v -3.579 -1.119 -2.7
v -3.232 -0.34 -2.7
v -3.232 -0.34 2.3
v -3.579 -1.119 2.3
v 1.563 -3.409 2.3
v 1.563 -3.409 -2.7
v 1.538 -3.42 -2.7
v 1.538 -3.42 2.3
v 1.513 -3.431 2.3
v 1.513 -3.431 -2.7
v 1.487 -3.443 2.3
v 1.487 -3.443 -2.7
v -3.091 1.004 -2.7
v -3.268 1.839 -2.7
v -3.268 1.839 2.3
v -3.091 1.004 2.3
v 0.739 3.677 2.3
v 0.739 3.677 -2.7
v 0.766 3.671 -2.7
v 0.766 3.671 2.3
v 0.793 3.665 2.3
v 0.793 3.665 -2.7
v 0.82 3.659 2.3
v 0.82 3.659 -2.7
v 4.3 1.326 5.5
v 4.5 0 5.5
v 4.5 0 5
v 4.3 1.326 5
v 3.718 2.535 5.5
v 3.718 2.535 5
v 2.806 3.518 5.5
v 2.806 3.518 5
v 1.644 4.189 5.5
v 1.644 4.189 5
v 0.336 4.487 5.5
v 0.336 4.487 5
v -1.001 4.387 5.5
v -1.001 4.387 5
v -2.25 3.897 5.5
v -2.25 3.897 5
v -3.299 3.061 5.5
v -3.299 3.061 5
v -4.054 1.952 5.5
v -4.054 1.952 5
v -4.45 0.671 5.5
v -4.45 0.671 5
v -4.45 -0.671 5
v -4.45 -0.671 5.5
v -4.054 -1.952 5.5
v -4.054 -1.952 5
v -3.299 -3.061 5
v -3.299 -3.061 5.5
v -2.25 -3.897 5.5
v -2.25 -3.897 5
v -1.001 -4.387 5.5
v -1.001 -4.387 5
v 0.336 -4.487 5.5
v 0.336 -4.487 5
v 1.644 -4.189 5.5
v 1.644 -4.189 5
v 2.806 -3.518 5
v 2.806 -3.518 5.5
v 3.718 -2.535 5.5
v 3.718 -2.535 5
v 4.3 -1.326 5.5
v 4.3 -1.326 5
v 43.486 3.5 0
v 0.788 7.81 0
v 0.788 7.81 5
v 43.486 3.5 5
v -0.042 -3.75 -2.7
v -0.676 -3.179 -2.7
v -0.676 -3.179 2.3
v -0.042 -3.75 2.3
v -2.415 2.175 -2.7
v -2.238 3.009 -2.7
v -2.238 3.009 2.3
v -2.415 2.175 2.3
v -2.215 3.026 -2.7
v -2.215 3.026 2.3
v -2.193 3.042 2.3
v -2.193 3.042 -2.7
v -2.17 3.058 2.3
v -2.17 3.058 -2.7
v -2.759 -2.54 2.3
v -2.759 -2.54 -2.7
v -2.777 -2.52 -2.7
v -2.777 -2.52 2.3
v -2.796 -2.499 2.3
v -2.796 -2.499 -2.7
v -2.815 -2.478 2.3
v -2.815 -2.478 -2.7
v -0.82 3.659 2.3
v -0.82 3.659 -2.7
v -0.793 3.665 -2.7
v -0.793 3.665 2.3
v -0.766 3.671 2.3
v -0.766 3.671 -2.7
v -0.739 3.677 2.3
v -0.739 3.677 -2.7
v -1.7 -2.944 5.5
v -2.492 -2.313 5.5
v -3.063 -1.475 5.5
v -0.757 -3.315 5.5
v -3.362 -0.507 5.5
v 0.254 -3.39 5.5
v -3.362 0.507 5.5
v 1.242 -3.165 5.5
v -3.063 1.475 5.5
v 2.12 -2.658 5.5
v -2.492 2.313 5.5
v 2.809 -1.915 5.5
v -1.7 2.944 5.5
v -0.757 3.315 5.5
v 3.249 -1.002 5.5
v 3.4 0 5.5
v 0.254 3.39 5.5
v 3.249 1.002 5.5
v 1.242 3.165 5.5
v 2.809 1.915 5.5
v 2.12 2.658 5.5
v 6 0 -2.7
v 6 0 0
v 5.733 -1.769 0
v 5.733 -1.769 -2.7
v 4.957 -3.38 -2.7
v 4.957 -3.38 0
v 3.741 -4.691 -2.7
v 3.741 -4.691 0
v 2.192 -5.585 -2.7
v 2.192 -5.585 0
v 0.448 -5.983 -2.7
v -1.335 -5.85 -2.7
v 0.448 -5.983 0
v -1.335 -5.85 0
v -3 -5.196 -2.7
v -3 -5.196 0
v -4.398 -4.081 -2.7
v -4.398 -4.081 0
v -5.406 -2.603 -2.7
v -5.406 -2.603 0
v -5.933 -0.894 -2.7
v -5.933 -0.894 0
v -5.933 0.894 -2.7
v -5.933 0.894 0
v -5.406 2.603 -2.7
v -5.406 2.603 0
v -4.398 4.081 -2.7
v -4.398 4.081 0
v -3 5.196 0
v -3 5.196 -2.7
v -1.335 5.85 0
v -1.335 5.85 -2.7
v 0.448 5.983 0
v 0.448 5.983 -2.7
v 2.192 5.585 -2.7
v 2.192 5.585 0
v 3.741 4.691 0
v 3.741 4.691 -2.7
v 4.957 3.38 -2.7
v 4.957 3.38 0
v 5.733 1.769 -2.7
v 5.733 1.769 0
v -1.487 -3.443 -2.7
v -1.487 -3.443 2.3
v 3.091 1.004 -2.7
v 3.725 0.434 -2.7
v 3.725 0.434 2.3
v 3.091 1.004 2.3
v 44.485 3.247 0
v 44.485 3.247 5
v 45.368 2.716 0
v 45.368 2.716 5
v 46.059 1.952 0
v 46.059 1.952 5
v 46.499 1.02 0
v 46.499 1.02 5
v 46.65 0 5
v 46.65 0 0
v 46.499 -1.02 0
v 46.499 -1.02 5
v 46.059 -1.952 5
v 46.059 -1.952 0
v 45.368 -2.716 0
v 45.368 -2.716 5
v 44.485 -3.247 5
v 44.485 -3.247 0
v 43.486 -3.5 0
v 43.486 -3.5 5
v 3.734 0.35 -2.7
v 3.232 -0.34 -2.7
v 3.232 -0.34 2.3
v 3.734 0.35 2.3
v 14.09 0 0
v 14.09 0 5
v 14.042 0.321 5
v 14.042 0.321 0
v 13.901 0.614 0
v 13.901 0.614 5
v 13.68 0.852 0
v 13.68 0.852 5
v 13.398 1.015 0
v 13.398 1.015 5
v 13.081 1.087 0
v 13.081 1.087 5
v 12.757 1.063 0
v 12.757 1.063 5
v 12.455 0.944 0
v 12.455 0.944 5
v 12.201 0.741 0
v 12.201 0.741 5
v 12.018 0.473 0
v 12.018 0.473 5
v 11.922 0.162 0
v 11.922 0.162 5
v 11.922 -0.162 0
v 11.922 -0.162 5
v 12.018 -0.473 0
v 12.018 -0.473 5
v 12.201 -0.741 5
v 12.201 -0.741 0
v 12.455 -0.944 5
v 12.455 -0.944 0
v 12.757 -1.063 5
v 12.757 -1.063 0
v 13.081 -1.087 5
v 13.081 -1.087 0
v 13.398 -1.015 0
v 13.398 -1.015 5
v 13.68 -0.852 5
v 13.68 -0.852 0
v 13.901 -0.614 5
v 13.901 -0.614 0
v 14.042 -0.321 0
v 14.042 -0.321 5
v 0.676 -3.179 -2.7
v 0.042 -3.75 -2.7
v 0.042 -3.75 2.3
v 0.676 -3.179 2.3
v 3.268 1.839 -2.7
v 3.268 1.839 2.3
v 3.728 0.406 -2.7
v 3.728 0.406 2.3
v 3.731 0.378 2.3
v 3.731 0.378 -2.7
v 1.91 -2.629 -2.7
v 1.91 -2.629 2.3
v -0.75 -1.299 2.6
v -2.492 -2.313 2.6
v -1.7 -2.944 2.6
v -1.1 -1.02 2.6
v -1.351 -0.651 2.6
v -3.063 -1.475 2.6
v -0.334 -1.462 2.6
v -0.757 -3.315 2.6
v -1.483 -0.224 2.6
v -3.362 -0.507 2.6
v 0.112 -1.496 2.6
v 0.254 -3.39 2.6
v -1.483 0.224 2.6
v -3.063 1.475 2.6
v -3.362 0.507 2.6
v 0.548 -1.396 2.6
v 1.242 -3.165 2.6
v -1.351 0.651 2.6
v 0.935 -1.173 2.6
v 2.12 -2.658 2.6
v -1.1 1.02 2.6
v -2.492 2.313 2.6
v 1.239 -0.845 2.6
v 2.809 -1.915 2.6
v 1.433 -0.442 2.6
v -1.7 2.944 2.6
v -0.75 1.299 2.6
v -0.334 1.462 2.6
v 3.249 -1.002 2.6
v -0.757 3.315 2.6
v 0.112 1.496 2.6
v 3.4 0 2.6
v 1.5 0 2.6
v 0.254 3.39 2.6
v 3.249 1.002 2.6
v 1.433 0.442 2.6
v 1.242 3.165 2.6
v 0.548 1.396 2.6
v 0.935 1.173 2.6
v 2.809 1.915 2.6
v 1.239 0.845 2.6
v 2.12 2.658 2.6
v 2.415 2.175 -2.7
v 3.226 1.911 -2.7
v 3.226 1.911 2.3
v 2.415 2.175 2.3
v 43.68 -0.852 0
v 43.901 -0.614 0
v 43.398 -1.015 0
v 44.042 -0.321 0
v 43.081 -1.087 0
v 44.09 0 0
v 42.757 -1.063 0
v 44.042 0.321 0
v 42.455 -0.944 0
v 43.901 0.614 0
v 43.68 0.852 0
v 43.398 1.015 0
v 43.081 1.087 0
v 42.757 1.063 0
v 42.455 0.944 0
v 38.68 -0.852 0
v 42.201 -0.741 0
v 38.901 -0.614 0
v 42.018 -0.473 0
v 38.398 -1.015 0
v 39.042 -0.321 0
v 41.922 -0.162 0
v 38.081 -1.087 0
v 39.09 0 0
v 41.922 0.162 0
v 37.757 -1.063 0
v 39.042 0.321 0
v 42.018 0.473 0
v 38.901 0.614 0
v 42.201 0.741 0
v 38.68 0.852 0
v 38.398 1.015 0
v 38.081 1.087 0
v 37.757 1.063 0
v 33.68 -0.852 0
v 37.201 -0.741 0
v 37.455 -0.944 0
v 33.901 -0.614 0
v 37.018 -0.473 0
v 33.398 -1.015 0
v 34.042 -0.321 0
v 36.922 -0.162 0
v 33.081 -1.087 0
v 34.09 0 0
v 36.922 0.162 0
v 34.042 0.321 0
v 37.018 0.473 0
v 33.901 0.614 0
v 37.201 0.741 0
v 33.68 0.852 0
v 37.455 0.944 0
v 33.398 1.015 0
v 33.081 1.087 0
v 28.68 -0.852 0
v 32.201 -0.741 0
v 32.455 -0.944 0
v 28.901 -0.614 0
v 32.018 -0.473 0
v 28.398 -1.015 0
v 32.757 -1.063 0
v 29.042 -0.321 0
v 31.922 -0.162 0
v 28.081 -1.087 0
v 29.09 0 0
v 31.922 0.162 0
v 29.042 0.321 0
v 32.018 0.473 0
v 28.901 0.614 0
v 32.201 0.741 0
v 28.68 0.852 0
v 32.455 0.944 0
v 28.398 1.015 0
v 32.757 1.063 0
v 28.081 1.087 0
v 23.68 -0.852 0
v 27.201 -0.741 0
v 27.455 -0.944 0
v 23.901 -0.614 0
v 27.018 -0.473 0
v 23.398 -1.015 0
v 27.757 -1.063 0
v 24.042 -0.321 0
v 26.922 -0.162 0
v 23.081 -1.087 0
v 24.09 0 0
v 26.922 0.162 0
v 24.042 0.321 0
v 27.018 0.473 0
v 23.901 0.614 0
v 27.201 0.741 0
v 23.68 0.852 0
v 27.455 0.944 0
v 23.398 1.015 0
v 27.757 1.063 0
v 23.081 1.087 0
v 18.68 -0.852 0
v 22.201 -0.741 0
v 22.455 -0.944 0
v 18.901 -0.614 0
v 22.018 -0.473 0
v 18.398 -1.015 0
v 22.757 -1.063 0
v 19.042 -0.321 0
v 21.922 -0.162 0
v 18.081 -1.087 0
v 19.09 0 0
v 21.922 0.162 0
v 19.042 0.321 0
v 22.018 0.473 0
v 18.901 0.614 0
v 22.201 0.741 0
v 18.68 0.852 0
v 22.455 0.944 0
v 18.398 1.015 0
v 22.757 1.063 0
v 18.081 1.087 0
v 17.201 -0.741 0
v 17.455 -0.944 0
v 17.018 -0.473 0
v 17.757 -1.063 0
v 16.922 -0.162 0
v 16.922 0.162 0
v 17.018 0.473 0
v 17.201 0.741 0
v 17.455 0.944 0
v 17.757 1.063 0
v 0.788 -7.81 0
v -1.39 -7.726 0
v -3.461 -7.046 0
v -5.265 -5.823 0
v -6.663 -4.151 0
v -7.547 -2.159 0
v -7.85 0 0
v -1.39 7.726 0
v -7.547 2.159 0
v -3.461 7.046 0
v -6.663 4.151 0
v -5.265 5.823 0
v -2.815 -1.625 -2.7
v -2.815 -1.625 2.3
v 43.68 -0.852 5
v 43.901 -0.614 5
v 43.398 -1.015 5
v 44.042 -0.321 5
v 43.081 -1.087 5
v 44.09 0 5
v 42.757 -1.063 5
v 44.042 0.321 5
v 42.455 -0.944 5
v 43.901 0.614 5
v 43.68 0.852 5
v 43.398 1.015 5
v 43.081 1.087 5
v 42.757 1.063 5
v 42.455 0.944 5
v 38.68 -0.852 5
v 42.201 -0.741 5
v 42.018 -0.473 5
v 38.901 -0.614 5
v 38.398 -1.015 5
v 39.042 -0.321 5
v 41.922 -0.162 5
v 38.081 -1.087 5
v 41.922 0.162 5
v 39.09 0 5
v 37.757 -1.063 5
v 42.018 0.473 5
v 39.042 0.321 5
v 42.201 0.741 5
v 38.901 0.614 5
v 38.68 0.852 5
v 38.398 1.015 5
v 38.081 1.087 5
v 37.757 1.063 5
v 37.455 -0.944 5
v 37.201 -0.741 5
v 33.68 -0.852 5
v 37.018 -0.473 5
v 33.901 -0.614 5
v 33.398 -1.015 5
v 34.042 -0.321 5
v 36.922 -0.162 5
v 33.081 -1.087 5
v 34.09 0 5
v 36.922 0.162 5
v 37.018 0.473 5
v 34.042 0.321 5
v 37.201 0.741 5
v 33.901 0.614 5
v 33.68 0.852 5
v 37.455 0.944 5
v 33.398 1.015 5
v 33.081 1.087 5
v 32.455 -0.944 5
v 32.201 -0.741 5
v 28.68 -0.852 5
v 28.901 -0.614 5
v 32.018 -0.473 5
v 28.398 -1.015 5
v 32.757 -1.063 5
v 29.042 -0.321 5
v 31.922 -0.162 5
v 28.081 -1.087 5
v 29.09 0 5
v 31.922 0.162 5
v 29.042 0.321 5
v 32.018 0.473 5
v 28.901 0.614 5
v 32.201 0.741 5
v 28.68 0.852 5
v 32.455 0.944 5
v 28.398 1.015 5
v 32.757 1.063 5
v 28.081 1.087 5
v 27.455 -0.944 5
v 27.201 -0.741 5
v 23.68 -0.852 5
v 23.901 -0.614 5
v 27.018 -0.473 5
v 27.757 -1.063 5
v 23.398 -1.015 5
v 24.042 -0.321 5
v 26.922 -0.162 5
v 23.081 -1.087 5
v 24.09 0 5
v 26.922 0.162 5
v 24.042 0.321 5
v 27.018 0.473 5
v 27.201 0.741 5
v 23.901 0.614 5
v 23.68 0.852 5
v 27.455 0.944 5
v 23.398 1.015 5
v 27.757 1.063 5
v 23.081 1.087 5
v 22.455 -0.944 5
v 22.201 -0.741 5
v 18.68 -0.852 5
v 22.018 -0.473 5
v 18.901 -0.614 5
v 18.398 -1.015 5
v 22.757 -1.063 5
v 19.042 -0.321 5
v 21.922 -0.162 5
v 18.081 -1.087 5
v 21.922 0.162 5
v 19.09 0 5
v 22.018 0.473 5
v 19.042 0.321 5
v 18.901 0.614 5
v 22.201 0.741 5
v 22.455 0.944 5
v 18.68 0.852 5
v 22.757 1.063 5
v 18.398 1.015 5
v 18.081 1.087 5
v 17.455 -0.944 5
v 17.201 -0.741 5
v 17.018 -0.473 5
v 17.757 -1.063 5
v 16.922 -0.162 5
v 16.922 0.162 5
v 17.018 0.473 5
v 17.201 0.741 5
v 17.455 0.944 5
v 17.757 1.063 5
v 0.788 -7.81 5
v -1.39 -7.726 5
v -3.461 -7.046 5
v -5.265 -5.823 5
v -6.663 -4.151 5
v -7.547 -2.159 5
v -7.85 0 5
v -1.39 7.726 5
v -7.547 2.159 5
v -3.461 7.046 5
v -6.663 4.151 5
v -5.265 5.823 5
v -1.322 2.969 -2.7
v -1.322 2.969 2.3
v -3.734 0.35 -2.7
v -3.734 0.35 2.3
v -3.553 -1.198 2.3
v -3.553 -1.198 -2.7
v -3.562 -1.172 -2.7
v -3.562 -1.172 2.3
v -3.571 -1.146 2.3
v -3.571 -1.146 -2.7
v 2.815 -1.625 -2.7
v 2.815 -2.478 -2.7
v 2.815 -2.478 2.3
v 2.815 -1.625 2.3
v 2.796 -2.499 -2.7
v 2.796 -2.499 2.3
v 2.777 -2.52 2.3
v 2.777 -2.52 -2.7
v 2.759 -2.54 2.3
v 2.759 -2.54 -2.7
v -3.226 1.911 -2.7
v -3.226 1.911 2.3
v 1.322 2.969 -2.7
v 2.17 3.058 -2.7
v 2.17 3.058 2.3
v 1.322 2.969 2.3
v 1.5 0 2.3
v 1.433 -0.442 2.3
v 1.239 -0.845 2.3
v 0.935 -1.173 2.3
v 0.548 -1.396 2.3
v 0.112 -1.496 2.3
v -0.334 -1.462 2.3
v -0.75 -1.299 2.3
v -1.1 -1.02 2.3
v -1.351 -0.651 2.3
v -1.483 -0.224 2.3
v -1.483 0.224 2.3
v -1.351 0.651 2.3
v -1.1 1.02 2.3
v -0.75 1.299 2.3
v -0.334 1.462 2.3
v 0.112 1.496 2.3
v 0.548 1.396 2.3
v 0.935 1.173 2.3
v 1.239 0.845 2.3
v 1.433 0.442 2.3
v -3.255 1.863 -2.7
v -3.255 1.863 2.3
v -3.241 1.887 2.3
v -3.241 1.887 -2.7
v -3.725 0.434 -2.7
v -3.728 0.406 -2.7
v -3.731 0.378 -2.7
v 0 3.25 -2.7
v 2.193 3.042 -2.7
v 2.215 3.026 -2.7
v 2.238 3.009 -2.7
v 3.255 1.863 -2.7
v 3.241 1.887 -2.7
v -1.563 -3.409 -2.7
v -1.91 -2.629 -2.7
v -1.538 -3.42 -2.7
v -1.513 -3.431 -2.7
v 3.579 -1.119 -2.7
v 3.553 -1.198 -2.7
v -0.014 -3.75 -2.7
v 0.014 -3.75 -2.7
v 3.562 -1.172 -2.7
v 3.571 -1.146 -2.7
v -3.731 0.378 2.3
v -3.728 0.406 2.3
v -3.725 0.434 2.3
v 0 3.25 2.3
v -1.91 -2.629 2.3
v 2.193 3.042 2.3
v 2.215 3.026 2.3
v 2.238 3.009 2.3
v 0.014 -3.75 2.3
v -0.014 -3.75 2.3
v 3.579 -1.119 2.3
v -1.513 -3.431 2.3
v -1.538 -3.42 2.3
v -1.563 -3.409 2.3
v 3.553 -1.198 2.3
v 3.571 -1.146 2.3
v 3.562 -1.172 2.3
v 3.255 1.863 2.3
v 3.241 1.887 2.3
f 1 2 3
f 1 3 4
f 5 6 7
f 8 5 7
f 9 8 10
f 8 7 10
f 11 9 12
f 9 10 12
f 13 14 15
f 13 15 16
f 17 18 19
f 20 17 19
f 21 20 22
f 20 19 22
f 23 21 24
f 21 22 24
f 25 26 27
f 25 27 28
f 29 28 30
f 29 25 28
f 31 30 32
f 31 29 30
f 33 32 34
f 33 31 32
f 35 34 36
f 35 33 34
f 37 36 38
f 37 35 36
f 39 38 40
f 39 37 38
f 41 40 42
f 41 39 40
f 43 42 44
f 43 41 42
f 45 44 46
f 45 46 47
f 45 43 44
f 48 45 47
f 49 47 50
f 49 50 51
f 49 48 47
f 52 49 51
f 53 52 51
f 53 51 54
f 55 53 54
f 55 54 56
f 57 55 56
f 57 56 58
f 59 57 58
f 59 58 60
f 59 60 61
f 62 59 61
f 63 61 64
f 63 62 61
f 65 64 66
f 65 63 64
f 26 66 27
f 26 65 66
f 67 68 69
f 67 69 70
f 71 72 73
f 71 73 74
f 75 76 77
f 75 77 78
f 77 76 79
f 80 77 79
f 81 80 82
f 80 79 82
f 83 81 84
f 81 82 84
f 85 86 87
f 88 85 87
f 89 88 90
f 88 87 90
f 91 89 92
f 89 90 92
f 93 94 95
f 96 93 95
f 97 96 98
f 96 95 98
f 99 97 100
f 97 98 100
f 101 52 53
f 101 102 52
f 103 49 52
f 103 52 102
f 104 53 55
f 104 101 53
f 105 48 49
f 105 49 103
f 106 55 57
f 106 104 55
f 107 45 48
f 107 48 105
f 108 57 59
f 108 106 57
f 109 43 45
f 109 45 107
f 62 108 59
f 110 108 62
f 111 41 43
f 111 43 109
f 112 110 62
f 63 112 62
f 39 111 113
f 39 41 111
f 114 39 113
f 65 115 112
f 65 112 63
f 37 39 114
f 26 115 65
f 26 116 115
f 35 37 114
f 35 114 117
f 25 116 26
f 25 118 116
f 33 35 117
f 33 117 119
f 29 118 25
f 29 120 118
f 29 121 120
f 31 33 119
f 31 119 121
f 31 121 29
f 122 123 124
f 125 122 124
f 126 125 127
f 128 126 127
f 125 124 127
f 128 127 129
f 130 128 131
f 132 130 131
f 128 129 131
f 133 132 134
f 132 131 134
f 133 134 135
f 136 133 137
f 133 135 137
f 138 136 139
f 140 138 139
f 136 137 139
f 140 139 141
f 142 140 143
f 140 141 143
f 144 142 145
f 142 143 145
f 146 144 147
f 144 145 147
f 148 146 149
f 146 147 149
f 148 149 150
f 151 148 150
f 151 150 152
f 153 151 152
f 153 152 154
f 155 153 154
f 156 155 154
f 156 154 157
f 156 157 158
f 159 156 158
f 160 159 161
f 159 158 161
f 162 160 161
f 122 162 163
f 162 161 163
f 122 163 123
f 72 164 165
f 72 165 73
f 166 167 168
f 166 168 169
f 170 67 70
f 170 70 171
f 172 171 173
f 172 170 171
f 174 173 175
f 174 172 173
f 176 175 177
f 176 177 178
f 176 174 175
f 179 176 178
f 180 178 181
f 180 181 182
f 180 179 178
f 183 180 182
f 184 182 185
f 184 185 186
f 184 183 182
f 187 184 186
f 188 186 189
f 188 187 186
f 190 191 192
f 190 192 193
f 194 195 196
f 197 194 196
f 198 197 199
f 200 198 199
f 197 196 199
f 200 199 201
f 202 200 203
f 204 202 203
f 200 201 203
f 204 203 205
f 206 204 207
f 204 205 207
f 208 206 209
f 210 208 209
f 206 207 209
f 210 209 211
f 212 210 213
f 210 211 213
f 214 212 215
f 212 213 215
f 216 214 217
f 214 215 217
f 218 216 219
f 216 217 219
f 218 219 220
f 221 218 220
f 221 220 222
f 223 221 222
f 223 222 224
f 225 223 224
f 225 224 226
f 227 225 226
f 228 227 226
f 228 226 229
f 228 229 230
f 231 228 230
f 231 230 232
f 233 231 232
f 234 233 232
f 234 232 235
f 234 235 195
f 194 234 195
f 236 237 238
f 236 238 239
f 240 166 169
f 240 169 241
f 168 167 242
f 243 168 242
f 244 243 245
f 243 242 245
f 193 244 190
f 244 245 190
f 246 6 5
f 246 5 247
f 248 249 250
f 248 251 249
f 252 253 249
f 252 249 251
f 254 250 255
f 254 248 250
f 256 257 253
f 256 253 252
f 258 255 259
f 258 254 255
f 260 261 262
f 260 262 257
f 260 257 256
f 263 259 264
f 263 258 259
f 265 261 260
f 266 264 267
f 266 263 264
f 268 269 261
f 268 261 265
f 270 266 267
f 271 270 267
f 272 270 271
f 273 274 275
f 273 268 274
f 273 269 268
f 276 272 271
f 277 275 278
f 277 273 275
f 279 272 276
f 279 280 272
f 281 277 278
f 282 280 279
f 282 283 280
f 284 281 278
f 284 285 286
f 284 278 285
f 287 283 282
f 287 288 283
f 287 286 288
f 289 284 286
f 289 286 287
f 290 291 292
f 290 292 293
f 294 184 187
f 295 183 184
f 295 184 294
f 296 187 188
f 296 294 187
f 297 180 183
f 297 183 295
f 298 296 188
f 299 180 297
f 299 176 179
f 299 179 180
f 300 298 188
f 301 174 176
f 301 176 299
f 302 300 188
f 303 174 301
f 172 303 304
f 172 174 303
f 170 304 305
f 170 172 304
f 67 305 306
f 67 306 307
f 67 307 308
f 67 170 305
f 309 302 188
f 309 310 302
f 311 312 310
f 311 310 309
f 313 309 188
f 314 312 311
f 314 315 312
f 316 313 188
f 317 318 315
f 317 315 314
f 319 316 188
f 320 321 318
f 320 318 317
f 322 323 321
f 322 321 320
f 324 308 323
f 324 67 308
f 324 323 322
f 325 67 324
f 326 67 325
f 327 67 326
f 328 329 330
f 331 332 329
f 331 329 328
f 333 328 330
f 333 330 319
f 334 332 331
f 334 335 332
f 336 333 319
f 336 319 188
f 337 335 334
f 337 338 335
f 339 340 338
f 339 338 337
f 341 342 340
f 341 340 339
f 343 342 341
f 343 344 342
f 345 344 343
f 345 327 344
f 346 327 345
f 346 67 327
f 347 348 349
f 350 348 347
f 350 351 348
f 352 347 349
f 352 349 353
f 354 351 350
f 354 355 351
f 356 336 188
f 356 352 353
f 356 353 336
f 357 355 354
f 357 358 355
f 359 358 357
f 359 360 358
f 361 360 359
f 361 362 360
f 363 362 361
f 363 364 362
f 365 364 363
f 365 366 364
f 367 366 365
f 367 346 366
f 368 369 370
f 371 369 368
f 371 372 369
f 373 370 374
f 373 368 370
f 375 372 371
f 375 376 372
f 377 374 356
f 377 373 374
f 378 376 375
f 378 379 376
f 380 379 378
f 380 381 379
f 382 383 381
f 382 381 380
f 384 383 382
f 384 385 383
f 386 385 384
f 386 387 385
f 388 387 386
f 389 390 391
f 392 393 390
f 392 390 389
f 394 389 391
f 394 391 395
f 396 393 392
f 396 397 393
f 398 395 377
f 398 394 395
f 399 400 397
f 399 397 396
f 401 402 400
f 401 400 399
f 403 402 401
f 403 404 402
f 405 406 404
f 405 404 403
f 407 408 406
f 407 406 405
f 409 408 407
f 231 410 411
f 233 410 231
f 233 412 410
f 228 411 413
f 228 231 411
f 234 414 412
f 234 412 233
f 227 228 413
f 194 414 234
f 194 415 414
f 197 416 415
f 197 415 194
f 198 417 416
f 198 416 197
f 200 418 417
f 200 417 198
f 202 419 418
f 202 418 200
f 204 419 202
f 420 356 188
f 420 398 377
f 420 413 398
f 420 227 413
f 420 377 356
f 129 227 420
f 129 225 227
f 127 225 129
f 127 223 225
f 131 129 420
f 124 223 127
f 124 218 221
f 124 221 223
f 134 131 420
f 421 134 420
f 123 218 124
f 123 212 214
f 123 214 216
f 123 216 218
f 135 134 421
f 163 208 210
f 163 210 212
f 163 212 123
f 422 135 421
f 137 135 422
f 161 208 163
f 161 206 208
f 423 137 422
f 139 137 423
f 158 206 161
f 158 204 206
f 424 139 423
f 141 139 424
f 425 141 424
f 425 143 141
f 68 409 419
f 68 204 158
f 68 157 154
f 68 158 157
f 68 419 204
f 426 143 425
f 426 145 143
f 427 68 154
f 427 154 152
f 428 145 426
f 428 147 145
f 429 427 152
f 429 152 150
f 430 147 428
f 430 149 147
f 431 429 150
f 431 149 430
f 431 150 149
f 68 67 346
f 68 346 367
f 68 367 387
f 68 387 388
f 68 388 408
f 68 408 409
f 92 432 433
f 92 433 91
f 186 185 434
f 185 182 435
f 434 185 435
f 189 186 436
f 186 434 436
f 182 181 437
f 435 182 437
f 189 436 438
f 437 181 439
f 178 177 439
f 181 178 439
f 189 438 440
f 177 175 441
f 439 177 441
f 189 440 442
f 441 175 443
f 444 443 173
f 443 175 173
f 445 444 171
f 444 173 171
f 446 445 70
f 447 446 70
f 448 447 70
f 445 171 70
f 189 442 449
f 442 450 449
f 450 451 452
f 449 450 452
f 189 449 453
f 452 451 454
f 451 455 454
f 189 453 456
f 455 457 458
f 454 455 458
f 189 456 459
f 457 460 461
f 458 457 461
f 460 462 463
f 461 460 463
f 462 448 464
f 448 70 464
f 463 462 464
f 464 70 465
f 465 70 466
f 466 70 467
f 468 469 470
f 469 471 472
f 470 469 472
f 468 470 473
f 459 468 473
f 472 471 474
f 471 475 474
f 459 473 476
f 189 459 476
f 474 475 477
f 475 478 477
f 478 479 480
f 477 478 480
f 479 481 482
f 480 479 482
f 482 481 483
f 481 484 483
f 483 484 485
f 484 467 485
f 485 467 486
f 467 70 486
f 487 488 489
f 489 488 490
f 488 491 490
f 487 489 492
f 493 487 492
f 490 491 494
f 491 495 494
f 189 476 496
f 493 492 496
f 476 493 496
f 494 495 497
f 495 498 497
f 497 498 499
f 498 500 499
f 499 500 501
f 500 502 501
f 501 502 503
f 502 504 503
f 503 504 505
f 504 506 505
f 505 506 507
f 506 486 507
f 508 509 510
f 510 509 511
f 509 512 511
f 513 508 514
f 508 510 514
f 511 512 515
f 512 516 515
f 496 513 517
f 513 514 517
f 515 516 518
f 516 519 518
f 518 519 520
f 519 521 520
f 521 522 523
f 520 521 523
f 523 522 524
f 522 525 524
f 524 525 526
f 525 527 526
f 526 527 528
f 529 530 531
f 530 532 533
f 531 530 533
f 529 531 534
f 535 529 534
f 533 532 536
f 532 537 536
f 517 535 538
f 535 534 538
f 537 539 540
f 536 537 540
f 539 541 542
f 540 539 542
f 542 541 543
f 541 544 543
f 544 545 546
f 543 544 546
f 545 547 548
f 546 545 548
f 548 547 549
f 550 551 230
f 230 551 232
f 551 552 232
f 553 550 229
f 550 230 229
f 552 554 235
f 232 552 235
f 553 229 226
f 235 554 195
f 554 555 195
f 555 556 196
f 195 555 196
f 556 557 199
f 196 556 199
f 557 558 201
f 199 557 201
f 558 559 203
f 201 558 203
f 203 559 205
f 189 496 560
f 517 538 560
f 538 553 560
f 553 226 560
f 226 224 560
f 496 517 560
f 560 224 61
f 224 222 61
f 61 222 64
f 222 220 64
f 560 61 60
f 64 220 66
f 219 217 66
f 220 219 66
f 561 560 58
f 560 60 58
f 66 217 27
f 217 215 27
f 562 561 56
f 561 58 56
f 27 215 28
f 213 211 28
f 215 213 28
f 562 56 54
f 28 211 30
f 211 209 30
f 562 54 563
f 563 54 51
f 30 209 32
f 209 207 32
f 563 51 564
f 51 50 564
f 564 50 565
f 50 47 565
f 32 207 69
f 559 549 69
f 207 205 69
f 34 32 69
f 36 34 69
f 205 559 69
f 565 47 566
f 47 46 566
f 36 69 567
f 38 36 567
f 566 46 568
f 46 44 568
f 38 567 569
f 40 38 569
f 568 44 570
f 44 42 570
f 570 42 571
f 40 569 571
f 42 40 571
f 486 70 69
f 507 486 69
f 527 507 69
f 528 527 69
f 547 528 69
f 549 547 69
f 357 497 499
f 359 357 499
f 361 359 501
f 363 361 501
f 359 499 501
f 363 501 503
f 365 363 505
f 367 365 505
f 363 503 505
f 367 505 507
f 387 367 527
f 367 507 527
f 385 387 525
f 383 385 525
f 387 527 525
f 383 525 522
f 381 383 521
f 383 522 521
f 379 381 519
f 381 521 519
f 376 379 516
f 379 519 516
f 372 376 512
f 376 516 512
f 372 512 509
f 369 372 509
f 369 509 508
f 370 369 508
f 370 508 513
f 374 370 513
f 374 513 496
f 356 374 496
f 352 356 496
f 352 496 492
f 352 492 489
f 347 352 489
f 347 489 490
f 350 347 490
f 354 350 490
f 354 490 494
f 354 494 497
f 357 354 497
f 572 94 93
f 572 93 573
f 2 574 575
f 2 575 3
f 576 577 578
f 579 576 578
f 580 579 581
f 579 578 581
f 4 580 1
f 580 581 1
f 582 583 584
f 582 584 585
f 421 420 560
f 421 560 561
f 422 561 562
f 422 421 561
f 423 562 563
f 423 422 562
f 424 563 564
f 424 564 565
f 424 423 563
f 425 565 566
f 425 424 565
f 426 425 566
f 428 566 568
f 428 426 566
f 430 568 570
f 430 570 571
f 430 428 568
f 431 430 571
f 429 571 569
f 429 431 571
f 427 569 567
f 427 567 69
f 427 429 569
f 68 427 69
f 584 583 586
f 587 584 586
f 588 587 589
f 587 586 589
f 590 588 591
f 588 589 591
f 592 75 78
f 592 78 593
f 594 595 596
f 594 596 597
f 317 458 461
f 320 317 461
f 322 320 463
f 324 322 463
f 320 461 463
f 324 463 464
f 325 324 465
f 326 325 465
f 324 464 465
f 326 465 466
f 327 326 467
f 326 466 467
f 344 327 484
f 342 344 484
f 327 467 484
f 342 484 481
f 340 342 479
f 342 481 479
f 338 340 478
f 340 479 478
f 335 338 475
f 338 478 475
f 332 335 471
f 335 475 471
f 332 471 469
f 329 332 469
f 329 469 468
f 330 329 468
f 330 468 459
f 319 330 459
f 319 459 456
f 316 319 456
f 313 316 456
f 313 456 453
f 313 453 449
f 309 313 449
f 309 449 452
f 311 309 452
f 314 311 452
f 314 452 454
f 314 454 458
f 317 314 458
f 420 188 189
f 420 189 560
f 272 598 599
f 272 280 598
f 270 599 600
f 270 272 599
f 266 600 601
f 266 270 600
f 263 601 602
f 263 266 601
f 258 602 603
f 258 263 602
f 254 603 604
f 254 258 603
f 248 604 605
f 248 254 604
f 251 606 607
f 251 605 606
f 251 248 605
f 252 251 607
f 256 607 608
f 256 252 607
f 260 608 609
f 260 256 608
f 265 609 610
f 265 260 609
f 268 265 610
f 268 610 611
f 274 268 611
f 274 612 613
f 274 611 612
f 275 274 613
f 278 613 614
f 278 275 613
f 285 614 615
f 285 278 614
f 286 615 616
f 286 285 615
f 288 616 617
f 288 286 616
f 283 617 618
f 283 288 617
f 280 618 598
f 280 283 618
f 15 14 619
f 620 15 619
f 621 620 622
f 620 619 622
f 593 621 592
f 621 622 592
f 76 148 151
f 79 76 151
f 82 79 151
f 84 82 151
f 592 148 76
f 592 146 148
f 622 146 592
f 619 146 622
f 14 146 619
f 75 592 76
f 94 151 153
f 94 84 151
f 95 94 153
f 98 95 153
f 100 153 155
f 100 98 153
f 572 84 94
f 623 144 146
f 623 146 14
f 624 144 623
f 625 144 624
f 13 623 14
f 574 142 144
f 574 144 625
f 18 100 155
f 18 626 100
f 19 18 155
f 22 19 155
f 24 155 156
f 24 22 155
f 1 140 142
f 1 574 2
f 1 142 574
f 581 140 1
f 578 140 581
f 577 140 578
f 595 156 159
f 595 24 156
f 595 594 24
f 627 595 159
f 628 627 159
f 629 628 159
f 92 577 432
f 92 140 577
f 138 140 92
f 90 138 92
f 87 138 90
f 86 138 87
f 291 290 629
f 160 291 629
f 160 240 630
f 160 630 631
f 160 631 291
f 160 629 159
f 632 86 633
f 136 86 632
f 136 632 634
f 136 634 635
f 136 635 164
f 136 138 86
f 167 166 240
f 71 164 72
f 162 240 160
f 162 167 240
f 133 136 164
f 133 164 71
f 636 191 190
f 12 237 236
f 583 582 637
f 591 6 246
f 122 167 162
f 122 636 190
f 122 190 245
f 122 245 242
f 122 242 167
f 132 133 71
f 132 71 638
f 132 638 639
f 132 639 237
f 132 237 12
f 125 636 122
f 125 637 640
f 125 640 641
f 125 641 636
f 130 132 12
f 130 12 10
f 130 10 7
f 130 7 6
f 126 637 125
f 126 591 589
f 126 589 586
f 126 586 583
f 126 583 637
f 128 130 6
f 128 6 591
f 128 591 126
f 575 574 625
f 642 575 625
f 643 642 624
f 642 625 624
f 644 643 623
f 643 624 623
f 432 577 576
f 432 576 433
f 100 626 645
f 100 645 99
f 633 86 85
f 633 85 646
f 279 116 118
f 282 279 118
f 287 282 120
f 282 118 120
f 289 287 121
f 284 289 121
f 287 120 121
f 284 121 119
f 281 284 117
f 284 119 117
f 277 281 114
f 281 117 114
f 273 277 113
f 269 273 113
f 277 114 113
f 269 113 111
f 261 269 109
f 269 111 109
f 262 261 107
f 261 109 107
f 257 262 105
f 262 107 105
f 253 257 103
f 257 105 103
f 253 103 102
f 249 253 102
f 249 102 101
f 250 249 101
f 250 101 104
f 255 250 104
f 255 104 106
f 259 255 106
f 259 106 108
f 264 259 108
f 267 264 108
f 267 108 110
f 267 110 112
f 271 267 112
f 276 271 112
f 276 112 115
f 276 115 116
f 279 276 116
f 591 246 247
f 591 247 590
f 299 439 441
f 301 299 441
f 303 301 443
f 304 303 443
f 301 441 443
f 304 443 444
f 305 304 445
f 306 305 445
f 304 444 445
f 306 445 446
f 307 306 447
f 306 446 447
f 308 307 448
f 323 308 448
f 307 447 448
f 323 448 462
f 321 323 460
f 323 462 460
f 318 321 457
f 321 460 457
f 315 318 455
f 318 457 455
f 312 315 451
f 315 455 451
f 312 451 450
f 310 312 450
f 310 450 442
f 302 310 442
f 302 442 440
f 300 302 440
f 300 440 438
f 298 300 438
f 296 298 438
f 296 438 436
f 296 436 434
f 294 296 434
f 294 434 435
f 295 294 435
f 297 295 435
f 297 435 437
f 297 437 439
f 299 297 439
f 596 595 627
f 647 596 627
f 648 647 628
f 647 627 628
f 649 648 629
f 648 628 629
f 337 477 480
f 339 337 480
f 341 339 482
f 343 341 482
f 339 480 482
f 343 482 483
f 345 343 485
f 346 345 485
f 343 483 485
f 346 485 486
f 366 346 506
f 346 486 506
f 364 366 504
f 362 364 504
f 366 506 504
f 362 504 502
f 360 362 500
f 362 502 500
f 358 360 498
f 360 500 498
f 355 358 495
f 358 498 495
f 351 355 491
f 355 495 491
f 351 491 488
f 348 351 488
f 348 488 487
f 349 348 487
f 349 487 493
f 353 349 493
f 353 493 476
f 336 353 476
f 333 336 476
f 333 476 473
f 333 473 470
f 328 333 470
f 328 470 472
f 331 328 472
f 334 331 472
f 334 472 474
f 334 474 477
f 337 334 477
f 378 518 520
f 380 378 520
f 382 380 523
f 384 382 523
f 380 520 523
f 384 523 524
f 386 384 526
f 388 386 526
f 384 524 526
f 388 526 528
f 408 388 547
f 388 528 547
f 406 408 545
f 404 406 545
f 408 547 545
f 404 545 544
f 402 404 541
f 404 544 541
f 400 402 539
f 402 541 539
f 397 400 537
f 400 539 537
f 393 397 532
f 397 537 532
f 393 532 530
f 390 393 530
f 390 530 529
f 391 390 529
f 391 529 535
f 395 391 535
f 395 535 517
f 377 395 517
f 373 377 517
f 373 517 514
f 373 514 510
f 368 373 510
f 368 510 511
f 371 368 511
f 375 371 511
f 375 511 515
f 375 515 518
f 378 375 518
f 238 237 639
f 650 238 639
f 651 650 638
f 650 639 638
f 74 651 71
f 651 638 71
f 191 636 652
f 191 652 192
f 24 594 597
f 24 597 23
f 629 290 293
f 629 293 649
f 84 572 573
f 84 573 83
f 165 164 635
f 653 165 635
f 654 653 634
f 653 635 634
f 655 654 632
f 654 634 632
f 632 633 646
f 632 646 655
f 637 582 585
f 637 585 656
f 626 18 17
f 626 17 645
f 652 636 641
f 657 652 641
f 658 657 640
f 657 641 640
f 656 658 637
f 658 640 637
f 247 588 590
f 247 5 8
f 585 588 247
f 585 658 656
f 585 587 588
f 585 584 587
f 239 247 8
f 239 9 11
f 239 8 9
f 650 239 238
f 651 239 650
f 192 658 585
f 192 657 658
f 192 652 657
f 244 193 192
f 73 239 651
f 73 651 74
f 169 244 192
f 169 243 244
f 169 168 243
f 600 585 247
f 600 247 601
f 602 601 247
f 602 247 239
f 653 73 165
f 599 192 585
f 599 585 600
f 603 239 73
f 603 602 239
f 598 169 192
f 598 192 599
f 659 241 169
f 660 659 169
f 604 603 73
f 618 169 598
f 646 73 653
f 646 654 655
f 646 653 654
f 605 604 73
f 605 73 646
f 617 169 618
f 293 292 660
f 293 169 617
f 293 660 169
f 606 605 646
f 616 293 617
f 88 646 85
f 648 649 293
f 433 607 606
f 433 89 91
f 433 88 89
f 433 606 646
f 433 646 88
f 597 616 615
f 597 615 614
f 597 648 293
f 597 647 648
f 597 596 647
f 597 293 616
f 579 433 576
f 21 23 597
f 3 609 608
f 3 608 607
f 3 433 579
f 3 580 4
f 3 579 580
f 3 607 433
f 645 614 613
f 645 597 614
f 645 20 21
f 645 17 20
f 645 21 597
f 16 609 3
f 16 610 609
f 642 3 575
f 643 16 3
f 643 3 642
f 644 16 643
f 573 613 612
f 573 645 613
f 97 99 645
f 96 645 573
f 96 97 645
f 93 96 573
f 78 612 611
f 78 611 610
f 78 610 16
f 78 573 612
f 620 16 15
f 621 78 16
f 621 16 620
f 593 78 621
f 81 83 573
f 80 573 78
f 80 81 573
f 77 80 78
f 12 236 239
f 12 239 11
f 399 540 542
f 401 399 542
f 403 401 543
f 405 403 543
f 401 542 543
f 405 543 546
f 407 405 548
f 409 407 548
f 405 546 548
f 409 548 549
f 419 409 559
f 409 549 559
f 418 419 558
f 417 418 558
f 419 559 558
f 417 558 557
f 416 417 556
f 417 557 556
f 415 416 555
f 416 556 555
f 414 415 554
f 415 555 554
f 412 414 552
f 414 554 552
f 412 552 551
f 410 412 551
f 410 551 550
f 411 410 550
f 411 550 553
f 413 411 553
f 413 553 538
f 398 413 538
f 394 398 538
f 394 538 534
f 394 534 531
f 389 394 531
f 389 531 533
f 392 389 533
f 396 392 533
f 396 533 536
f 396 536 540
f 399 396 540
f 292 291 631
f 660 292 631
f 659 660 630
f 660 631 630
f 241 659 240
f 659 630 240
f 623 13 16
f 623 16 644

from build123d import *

# Parameters (mm, degrees)
BOSS_EXTRUDE1_DEPTH = 5
CUT_EXTRUDE1_REACH  = 49.569
SKETCH2_R           = 1.5
SKETCH3_R           = 3.4
CUT_EXTRUDE2_DEPTH  = 2.4
BOSS_EXTRUDE2_START = 0.5
SKETCH4_R           = 4.5
SKETCH4_R_2         = 3.4
BOSS_EXTRUDE2_DEPTH = 0.5
SKETCH6_R           = 6
SKETCH6_R_2         = 1.5
BOSS_EXTRUDE3_DEPTH = 2.7
SKETCH7_R           = 3.75
CUT_EXTRUDE4_DEPTH  = 5
BOSS_EXTRUDE4_DEPTH = 5
CIRPATTERN2_COUNT   = 15
CUT_EXTRUDE5_REACH  = 49.928
SKETCH10_R          = 1.09


with BuildPart() as part:
    # Sketch1 → Boss-Extrude1 (new body)
    with BuildSketch(Plane.XY):
        with BuildLine():
            Line((0.788456111, 7.810303257), (43.485538544, 3.5))
            ThreePointArc((43.485538544, 3.5), (46.65, 0), (43.485538544, -3.5))
            Line((43.485538544, -3.5), (0.788456111, -7.810303257))
            ThreePointArc((0.788456111, -7.810303257), (-7.85, 0), (0.788456111, 7.810303257))
        make_face()
    extrude(amount=BOSS_EXTRUDE1_DEPTH)

    # Sketch2 → Cut-Extrude1 (cut, up to next)
    with BuildSketch(Plane.XY.offset(5), mode=Mode.PRIVATE) as cut_extrude1_sk1:
        Circle(SKETCH2_R)
    cut_extrude1_tool1 = extrude(cut_extrude1_sk1.sketch, amount=-CUT_EXTRUDE1_REACH, mode=Mode.PRIVATE) & part.part
    add(cut_extrude1_tool1.solids().sort_by_distance((0, 0, 5))[0], mode=Mode.SUBTRACT)

    # Sketch3 → Cut-Extrude2 (cut)
    with BuildSketch(Plane.XY.offset(5)):
        Circle(SKETCH3_R)
    extrude(amount=-CUT_EXTRUDE2_DEPTH, mode=Mode.SUBTRACT)

    # Sketch4 → Boss-Extrude2 (add)
    with BuildSketch(Plane.XY.offset(5).offset(BOSS_EXTRUDE2_START)):
        Circle(SKETCH4_R)
        Circle(SKETCH4_R_2, mode=Mode.SUBTRACT)
    extrude(amount=-BOSS_EXTRUDE2_DEPTH)

    # Sketch6 → Boss-Extrude3 (add)
    with BuildSketch(Plane(origin=(0, 0, 0), x_dir=(-1, 0, 0), z_dir=(0, 0, -1))):
        with Locations(Location((0, 0, 0), (0, 0, 180))):
            Circle(SKETCH6_R)
        with Locations(Location((0, 0, 0), (0, 0, 180))):
            Circle(SKETCH6_R_2, mode=Mode.SUBTRACT)
    extrude(amount=BOSS_EXTRUDE3_DEPTH)

    # Sketch7 → Cut-Extrude4 (cut)
    with BuildSketch(Plane(origin=(0, 0, -2.7), x_dir=(-1, 0, 0), z_dir=(0, 0, -1))):
        Circle(SKETCH7_R)
    extrude(amount=-CUT_EXTRUDE4_DEPTH, mode=Mode.SUBTRACT)

    # Sketch8 → Boss-Extrude4 (add)
    with BuildSketch(Plane(origin=(0, 0, -2.7), x_dir=(-1, 0, 0), z_dir=(0, 0, -1))):
        with BuildLine():
            Line((-0.738744308, 3.676514225), (0, 3.25))
            Line((0, 3.25), (0.738744308, 3.676514225))
            ThreePointArc((0.738744308, 3.676514225), (0, 3.75), (-0.738744308, 3.676514225))
        make_face()
    boss_extrude4 = extrude(amount=-BOSS_EXTRUDE4_DEPTH)

    # CirPattern2: Boss-Extrude4 ×15 about axis
    cirpattern2_axis = Axis((0, 0, 0), (0, 0, 1))
    for i in range(1, CIRPATTERN2_COUNT):
        add(boss_extrude4.rotate(cirpattern2_axis, i * 360 / CIRPATTERN2_COUNT))

    # Sketch10 → Cut-Extrude5 (cut, up to next)
    with BuildSketch(Plane.XY.offset(5), mode=Mode.PRIVATE) as cut_extrude5_sk1:
        with Locations((43, 0)):
            Circle(SKETCH10_R)
    cut_extrude5_tool1 = extrude(cut_extrude5_sk1.sketch, amount=-CUT_EXTRUDE5_REACH, mode=Mode.PRIVATE) & part.part
    # Sketch10 → Cut-Extrude5 (cut, up to next)
    with BuildSketch(Plane.XY.offset(5), mode=Mode.PRIVATE) as cut_extrude5_sk2:
        with Locations((38, 0)):
            Circle(SKETCH10_R)
    cut_extrude5_tool2 = extrude(cut_extrude5_sk2.sketch, amount=-CUT_EXTRUDE5_REACH, mode=Mode.PRIVATE) & part.part
    # Sketch10 → Cut-Extrude5 (cut, up to next)
    with BuildSketch(Plane.XY.offset(5), mode=Mode.PRIVATE) as cut_extrude5_sk3:
        with Locations((33, 0)):
            Circle(SKETCH10_R)
    cut_extrude5_tool3 = extrude(cut_extrude5_sk3.sketch, amount=-CUT_EXTRUDE5_REACH, mode=Mode.PRIVATE) & part.part
    # Sketch10 → Cut-Extrude5 (cut, up to next)
    with BuildSketch(Plane.XY.offset(5), mode=Mode.PRIVATE) as cut_extrude5_sk4:
        with Locations((28, 0)):
            Circle(SKETCH10_R)
    cut_extrude5_tool4 = extrude(cut_extrude5_sk4.sketch, amount=-CUT_EXTRUDE5_REACH, mode=Mode.PRIVATE) & part.part
    # Sketch10 → Cut-Extrude5 (cut, up to next)
    with BuildSketch(Plane.XY.offset(5), mode=Mode.PRIVATE) as cut_extrude5_sk5:
        with Locations((23, 0)):
            Circle(SKETCH10_R)
    cut_extrude5_tool5 = extrude(cut_extrude5_sk5.sketch, amount=-CUT_EXTRUDE5_REACH, mode=Mode.PRIVATE) & part.part
    # Sketch10 → Cut-Extrude5 (cut, up to next)
    with BuildSketch(Plane.XY.offset(5), mode=Mode.PRIVATE) as cut_extrude5_sk6:
        with Locations((18, 0)):
            Circle(SKETCH10_R)
    cut_extrude5_tool6 = extrude(cut_extrude5_sk6.sketch, amount=-CUT_EXTRUDE5_REACH, mode=Mode.PRIVATE) & part.part
    # Sketch10 → Cut-Extrude5 (cut, up to next)
    with BuildSketch(Plane.XY.offset(5), mode=Mode.PRIVATE) as cut_extrude5_sk7:
        with Locations((13, 0)):
            Circle(SKETCH10_R)
    cut_extrude5_tool7 = extrude(cut_extrude5_sk7.sketch, amount=-CUT_EXTRUDE5_REACH, mode=Mode.PRIVATE) & part.part
    add(cut_extrude5_tool1.solids().sort_by_distance((43, 0, 5))[0], mode=Mode.SUBTRACT)
    add(cut_extrude5_tool2.solids().sort_by_distance((38, 0, 5))[0], mode=Mode.SUBTRACT)
    add(cut_extrude5_tool3.solids().sort_by_distance((33, 0, 5))[0], mode=Mode.SUBTRACT)
    add(cut_extrude5_tool4.solids().sort_by_distance((28, 0, 5))[0], mode=Mode.SUBTRACT)
    add(cut_extrude5_tool5.solids().sort_by_distance((23, 0, 5))[0], mode=Mode.SUBTRACT)
    add(cut_extrude5_tool6.solids().sort_by_distance((18, 0, 5))[0], mode=Mode.SUBTRACT)
    add(cut_extrude5_tool7.solids().sort_by_distance((13, 0, 5))[0], mode=Mode.SUBTRACT)


solid = part.part
